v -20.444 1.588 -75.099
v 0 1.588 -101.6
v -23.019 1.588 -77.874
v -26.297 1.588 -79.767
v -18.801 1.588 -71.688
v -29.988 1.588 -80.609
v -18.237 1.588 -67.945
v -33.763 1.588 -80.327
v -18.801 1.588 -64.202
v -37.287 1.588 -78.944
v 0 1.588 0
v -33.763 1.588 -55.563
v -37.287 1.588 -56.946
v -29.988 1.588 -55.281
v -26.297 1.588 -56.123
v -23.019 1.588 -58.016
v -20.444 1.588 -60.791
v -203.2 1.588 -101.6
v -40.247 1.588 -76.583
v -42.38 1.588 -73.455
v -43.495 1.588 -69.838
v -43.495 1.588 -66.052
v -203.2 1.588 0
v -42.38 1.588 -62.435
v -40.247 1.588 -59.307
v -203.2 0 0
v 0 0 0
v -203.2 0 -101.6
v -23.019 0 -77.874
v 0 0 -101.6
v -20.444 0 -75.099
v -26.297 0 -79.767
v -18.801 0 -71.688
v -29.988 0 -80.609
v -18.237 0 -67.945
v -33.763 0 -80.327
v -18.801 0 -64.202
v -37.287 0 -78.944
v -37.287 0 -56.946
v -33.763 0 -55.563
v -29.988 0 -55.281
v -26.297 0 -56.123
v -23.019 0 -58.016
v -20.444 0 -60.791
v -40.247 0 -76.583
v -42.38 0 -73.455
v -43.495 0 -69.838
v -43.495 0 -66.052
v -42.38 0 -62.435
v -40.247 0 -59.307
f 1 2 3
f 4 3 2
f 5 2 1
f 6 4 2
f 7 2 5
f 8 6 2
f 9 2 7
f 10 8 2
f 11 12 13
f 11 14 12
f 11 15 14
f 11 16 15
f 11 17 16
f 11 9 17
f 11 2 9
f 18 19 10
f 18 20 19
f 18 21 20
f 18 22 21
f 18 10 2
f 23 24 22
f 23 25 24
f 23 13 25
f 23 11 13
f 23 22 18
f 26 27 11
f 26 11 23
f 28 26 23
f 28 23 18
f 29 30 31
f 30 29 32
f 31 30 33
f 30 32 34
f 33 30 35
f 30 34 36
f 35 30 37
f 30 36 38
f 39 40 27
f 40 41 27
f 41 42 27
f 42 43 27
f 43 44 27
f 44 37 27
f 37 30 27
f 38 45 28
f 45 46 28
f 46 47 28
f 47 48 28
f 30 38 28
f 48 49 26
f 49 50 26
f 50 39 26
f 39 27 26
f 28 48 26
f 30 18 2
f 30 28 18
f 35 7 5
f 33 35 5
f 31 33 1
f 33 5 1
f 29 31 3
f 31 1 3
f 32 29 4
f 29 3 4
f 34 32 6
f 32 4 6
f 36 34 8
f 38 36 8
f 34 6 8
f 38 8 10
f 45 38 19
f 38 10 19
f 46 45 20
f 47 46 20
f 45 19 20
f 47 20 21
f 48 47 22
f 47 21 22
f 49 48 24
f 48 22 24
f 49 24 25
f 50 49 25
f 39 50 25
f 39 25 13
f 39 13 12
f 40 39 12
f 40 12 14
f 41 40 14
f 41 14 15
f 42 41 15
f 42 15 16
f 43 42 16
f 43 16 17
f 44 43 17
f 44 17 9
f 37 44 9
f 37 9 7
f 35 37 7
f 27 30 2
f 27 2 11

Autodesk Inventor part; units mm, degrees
ref_plane "YZ Plane" through (0, 0, 0) normal (1, 0, 0) x (0, 1, 0)
ref_plane "XZ Plane" through (0, 0, 0) normal (0, 1, 0) x (-1, 0, 0)
ref_plane "XY Plane" through (0, 0, 0) normal (0, 0, 1) x (1, 0, 0)
sketch "Sketch1" plane through (0, 0, 0) normal (0, 1, 0) x (-1, 0, 0)
  line L0 (0, 0) -> (203.2, 0)
  line L1 (203.2, 0) -> (203.2, -101.6)
  line L2 (203.2, -101.6) -> (0, -101.6)
  line L3 (0, -101.6) -> (0, 0)
  dimension "d0" = 203.2
  dimension "d1" = 101.6
extrude "Extrusion1" add sketch "Sketch1" along normal blind 1.5875
sketch "Sketch2" plane through (0, 1.5875, 0) normal (0, 1, 0) x (1, 0, 0)
  circle A0 centre (-30.9372, 67.945) radius 12.7
  line L0 (0, 0) -> (0, 101.6) projected
  line L1 (-203.2, 0) -> (0, 0) projected
  dimension "d4" = 25.4
  dimension "d5" = 30.9372
  dimension "d6" = 67.945
extrude "Extrusion2" cut sketch "Sketch2" against normal blind 25.4
properties part number "TSV-Panel"
